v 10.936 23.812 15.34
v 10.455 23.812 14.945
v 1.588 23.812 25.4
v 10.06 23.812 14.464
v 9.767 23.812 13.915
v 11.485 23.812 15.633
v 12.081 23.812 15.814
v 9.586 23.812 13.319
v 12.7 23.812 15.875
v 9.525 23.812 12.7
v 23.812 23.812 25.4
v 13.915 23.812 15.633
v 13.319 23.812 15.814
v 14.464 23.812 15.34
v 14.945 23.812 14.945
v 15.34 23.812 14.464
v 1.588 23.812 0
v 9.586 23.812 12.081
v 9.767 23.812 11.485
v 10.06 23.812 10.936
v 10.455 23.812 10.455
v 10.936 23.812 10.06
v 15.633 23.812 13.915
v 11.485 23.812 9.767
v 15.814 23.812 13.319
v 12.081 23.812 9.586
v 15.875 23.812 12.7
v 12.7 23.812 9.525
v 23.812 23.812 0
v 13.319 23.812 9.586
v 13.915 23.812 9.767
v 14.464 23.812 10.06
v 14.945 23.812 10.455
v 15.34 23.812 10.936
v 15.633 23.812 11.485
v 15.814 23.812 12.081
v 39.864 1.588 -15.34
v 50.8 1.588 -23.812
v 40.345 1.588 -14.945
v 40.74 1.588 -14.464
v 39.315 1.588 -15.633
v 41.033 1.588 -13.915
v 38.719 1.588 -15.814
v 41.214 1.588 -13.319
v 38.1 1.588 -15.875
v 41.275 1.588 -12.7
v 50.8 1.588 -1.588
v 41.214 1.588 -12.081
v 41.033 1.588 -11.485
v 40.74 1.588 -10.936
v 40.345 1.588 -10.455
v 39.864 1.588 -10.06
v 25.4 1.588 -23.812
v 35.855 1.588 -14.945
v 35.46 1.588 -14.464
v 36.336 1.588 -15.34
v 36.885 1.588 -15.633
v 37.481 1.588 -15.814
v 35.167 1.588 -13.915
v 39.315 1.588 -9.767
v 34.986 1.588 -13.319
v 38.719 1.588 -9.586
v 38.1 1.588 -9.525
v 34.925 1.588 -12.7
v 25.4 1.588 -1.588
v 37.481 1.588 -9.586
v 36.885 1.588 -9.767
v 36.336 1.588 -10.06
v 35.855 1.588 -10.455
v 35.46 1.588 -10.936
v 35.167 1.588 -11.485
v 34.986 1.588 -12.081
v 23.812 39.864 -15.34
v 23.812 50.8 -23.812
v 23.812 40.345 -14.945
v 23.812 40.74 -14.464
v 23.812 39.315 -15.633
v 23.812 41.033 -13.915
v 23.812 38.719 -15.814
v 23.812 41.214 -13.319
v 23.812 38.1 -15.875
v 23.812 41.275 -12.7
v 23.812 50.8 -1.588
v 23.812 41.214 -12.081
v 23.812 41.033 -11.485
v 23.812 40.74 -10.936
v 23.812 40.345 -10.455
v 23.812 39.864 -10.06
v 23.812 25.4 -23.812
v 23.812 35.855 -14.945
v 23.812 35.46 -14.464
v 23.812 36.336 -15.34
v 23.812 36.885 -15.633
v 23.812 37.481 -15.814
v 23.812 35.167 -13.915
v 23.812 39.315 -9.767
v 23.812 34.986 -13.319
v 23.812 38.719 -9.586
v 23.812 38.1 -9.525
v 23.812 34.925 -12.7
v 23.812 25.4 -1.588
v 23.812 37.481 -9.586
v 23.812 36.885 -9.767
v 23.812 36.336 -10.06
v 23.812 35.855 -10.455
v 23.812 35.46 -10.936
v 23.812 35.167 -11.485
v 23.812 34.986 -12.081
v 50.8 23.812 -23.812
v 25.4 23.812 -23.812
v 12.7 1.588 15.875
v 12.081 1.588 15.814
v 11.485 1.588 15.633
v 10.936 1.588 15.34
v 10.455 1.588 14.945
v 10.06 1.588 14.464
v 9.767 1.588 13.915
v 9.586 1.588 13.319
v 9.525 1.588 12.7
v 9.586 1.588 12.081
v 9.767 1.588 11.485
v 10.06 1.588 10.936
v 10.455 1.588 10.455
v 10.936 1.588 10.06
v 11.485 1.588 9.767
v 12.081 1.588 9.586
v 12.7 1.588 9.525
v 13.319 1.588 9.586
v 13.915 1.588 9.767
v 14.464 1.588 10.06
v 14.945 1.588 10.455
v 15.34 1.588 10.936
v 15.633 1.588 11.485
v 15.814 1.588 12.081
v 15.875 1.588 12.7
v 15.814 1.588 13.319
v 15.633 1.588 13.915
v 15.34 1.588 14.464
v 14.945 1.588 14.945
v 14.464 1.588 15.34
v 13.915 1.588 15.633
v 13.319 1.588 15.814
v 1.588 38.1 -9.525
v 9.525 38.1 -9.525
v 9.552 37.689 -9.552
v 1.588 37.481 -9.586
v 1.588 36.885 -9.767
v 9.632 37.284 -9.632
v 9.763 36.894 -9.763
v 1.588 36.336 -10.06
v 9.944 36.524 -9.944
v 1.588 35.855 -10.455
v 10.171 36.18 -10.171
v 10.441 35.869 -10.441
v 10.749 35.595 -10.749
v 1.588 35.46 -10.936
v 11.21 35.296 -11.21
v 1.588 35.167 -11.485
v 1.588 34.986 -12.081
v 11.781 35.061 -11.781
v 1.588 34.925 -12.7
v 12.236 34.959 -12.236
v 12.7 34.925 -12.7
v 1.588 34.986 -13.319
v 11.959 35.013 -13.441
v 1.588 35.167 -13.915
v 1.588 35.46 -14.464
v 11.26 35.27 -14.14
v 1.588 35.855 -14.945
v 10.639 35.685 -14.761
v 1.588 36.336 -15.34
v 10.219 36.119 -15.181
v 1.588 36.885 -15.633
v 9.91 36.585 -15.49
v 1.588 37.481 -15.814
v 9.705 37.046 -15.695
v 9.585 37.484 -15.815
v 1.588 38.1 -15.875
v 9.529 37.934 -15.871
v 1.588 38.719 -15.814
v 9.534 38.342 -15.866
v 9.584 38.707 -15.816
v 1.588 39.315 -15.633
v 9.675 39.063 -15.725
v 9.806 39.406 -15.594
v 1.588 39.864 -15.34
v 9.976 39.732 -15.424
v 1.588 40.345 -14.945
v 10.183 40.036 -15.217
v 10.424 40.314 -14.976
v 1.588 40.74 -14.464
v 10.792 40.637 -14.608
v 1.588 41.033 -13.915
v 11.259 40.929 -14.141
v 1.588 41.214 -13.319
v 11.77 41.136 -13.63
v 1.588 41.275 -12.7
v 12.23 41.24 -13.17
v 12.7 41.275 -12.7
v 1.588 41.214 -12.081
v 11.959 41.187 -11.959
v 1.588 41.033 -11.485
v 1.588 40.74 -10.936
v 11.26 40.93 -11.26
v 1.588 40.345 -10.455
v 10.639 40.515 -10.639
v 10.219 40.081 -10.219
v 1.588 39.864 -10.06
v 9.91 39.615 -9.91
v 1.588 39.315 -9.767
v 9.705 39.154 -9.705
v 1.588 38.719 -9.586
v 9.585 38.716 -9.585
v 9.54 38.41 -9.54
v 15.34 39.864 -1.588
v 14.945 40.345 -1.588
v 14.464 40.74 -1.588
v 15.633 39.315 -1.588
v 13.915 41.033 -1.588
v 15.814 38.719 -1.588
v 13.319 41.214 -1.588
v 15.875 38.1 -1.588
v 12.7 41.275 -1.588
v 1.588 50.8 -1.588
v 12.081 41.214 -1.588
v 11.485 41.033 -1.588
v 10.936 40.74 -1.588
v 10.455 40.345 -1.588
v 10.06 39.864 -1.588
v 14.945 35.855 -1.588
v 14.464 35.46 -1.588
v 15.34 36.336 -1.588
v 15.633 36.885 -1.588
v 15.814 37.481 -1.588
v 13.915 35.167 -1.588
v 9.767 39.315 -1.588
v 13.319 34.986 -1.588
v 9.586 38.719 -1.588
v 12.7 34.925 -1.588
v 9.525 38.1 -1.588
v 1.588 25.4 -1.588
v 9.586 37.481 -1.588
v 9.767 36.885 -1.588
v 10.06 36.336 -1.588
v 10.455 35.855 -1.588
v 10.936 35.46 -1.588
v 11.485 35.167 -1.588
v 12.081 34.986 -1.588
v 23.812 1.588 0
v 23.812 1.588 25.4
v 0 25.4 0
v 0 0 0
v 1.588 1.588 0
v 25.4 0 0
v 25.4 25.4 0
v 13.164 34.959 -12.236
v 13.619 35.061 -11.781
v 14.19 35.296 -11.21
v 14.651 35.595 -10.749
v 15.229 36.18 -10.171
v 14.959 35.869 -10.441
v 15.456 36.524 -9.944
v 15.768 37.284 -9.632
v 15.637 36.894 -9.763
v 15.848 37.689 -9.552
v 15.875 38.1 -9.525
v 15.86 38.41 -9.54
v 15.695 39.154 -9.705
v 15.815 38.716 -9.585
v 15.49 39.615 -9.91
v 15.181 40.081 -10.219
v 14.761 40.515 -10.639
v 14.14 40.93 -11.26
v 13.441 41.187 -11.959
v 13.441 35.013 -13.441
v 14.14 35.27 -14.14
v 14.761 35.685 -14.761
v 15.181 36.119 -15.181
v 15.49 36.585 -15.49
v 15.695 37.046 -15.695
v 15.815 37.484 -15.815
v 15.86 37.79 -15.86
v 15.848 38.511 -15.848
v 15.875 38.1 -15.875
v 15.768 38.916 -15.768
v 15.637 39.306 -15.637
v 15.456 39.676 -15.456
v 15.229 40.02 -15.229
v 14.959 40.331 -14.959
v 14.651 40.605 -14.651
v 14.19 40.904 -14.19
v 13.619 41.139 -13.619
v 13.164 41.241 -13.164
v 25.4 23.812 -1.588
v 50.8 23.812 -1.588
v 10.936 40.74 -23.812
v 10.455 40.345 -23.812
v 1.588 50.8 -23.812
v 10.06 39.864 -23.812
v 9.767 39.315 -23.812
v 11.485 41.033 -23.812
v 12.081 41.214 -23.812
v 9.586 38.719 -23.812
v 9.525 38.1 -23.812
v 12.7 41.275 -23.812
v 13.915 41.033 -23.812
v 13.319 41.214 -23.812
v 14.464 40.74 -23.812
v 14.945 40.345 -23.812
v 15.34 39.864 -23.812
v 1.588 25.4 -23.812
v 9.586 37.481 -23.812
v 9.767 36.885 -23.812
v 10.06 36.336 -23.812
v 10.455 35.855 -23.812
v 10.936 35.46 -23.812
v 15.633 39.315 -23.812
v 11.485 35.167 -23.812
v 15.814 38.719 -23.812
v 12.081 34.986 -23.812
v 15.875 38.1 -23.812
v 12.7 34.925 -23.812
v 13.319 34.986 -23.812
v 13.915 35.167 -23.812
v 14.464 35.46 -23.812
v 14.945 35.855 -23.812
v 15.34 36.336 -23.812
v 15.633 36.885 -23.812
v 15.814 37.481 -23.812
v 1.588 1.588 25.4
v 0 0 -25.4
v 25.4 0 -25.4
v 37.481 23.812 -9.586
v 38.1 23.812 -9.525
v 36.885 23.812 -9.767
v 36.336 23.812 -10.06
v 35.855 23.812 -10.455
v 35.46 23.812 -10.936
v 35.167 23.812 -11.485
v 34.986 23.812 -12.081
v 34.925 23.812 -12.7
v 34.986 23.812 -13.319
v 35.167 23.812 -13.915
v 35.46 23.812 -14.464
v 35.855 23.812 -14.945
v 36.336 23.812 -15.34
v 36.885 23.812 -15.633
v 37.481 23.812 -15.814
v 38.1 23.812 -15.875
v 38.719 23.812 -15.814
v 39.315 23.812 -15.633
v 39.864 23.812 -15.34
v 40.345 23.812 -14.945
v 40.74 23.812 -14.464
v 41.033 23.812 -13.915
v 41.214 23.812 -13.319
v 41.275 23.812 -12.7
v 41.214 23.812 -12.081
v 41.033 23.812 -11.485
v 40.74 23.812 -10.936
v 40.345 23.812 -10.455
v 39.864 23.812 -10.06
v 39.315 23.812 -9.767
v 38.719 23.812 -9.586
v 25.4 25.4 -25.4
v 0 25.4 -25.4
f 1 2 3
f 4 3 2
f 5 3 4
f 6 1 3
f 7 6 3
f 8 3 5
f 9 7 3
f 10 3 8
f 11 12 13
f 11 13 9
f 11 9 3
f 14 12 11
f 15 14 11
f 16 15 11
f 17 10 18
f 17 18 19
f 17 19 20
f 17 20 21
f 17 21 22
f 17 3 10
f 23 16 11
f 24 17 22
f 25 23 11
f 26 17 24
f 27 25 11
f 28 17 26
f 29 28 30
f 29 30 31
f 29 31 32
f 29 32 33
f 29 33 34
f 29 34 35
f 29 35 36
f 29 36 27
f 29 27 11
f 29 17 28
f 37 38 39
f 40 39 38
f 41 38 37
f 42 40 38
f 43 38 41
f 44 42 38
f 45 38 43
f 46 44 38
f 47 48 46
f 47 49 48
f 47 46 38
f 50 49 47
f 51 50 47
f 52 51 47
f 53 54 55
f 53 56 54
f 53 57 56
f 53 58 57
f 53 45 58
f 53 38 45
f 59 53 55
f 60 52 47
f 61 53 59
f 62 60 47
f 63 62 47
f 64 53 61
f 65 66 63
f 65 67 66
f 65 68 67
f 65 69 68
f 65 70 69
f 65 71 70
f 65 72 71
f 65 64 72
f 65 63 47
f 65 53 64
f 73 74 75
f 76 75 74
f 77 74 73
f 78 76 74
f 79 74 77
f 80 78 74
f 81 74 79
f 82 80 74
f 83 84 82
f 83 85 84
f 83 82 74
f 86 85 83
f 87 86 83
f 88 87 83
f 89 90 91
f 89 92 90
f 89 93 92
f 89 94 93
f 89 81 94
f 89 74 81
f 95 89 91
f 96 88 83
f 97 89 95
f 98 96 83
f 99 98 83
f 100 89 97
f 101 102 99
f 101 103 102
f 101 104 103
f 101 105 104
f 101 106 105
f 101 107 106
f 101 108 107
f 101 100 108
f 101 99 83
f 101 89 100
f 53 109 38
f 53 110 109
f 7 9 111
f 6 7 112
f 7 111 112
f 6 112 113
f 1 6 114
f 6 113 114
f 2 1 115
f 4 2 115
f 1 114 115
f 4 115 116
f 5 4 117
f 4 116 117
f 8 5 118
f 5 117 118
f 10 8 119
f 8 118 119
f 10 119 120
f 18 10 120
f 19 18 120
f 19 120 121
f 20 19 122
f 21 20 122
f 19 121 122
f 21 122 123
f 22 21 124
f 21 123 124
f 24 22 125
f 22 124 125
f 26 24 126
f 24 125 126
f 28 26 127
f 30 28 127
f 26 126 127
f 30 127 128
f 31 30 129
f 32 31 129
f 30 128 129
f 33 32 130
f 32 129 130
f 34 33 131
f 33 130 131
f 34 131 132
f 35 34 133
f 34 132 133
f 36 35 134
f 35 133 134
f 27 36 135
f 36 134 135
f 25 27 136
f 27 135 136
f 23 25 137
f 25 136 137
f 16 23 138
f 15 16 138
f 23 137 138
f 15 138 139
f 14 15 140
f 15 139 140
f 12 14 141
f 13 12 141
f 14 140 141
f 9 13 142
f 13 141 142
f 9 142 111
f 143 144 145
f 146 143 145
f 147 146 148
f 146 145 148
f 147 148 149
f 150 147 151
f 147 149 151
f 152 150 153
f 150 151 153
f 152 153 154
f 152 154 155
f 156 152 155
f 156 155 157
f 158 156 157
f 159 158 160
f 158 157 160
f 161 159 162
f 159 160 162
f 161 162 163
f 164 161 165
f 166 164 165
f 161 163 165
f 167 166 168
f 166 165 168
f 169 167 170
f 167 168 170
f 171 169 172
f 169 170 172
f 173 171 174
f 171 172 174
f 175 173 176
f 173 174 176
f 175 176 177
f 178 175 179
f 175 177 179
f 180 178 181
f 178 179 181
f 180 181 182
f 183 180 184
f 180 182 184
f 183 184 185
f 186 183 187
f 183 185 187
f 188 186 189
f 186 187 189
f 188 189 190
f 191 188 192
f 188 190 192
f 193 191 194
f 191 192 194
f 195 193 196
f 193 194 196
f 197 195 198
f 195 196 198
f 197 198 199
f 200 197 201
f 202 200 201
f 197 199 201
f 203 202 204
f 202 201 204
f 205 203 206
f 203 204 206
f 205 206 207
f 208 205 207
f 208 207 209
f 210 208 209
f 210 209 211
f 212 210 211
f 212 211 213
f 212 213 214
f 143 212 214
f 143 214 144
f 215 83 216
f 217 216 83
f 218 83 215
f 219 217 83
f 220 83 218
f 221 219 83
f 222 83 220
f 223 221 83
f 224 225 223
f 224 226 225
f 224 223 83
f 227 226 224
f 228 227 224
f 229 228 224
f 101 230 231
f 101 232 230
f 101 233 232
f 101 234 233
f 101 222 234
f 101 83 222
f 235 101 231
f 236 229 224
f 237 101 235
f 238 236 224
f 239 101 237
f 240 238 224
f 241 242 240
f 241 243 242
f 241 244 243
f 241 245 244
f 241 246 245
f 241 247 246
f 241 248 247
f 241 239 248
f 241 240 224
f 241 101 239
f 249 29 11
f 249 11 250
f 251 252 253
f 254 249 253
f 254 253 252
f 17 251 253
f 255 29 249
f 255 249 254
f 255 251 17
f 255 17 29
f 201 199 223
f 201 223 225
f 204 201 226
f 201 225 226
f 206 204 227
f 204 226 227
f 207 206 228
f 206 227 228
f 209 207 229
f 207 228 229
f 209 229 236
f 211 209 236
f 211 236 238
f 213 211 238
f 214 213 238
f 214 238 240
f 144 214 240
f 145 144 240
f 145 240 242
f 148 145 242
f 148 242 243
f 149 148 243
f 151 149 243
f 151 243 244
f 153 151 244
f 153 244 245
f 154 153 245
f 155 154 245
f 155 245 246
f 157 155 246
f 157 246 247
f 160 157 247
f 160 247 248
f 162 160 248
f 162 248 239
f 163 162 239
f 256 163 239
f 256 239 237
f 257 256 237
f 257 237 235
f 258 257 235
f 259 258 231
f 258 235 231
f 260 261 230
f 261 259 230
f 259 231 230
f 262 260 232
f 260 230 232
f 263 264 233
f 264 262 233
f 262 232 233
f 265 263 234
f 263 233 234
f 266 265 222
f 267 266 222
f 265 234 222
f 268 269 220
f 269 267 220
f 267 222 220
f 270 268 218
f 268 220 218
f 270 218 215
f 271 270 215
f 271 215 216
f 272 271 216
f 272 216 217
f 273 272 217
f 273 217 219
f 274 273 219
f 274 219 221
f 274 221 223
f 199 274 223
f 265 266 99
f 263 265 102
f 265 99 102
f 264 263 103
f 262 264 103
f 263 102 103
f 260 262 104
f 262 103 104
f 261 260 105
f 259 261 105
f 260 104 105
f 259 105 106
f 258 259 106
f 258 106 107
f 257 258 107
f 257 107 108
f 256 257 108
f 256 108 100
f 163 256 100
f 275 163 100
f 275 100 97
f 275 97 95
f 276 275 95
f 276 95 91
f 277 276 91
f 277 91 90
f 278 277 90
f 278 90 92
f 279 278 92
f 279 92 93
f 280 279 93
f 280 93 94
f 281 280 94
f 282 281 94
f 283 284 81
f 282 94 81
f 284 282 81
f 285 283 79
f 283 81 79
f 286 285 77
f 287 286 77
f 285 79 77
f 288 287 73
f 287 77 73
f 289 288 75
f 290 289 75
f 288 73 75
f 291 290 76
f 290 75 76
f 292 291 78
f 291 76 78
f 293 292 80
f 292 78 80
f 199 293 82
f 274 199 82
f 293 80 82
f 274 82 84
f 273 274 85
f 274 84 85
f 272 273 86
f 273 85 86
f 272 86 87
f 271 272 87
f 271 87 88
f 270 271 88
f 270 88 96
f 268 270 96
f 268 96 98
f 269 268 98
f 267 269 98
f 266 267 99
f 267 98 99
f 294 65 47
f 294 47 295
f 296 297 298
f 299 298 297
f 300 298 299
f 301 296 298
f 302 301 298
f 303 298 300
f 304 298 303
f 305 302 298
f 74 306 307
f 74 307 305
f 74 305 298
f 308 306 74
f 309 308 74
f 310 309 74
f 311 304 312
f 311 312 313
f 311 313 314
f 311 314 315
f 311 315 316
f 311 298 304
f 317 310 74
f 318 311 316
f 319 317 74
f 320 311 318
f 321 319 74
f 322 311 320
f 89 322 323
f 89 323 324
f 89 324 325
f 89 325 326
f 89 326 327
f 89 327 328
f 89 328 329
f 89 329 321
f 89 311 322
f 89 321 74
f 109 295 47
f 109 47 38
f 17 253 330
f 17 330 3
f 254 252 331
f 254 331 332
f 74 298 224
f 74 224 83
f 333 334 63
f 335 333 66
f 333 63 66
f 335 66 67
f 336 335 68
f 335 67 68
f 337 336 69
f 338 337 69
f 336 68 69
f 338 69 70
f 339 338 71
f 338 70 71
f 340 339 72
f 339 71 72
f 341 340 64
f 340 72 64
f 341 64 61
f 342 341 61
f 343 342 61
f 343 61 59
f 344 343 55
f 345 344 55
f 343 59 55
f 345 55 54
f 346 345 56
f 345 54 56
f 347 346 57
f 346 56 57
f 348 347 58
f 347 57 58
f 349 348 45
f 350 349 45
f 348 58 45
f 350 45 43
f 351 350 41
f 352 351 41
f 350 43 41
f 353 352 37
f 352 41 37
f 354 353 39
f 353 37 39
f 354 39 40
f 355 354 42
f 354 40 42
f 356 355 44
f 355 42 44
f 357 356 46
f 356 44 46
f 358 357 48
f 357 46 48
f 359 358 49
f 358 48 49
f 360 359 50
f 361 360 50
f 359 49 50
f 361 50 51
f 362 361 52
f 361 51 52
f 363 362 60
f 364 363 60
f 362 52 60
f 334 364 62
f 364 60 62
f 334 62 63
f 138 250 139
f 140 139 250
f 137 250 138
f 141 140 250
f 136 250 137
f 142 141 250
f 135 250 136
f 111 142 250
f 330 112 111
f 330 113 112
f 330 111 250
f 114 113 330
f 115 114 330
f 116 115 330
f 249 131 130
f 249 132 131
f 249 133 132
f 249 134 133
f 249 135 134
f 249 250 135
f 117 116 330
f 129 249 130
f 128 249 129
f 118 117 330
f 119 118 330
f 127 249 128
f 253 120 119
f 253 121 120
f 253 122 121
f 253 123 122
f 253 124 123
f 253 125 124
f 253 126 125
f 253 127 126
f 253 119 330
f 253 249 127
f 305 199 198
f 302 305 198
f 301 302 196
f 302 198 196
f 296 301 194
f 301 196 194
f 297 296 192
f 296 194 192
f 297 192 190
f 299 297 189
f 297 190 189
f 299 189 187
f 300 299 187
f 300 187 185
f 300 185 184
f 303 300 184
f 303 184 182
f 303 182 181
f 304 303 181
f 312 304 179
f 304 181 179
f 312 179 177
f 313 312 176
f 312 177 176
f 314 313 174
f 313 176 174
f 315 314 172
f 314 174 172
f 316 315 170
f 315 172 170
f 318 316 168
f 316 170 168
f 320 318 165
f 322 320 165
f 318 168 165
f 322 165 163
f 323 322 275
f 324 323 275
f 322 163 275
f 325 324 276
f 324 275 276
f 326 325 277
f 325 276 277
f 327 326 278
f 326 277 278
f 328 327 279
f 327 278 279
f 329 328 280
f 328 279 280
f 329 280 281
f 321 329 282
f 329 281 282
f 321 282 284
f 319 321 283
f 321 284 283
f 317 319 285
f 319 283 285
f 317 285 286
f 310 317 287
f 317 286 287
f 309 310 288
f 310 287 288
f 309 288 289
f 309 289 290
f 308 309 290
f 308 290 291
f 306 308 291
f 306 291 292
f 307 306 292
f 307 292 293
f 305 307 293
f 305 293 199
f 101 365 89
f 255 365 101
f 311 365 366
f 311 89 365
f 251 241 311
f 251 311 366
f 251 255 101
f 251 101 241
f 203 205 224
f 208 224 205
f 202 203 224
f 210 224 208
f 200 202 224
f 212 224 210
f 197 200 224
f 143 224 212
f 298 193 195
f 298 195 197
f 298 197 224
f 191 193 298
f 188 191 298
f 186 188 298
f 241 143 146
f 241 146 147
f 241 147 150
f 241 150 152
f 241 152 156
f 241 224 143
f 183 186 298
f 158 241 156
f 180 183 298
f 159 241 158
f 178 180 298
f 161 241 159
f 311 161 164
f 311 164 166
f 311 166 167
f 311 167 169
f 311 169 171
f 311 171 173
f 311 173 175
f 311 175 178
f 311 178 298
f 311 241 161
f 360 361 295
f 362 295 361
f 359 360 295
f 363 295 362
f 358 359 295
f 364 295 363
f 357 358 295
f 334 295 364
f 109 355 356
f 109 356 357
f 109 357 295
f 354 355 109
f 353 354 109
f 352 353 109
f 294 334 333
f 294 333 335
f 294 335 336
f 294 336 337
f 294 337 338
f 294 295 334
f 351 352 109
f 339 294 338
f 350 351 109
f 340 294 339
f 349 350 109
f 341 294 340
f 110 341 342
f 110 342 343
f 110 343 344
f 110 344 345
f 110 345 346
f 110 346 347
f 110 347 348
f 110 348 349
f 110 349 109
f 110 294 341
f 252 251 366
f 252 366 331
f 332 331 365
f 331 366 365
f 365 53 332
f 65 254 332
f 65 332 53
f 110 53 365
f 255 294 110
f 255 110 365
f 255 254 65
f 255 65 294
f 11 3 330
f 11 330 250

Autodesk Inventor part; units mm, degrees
ref_plane "YZ Plane" through (0, 0, 0) normal (1, 0, 0) x (0, 1, 0)
ref_plane "XZ Plane" through (0, 0, 0) normal (0, 1, 0) x (-1, 0, 0)
ref_plane "XY Plane" through (0, 0, 0) normal (0, 0, 1) x (1, 0, 0)
sketch "Sketch1" plane through (0, 0, 0) normal (0, 0, 1) x (1, 0, 0)
  line L0 (0, 0) -> (25.4, 0)
  line L1 (25.4, 0) -> (25.4, 25.4)
  line L2 (25.4, 25.4) -> (0, 25.4)
  line L3 (0, 25.4) -> (0, 0)
  line L4 (1.5875, 23.8125) -> (23.8125, 23.8125)
  line L5 (23.8125, 23.8125) -> (23.8125, 1.5875)
  line L6 (23.8125, 1.5875) -> (1.5875, 1.5875)
  line L7 (1.5875, 1.5875) -> (1.5875, 23.8125)
  dimension "d0" = 25.4
  dimension "d1" = 25.4
  dimension "d4" = 1.5875
extrude "Extrusion1" add sketch "Sketch1" against normal blind 25.4 contours L3 L2 L1 L0 | L4 L5 L6 L7
extrude "Extrusion2" add sketch "Sketch1" along normal blind 25.4 contours L4 L5 L6 L7
sketch "Sketch2" plane through (25.4, 0, 0) normal (1, 0, 0) x (0, 0, -1)
  line L0 (25.4, 0) -> (25.4, 25.4) projected
  line L1 (0, 25.4) -> (25.4, 25.4) projected
  line L2 (0, 0) -> (0, 25.4) projected
  line L3 (0, 0) -> (25.4, 0) projected
  line L4 (23.8125, 23.8125) -> (23.8125, 1.5875)
  line L5 (23.8125, 1.5875) -> (1.5875, 1.5875)
  line L6 (1.5875, 1.5875) -> (1.5875, 23.8125)
  line L7 (1.5875, 23.8125) -> (23.8125, 23.8125)
  dimension "d8" = 1.5875
sketch "Sketch3" plane through (0, 25.4, 0) normal (0, 1, 0) x (1, 0, 0)
  line L0 (25.4, 25.4) -> (0, 25.4) projected
  line L1 (0, 0) -> (0, 25.4) projected
  line L2 (25.4, 0) -> (0, 0) projected
  line L3 (25.4, 0) -> (25.4, 25.4) projected
  line L4 (1.5875, 23.8125) -> (23.8125, 23.8125)
  line L5 (23.8125, 23.8125) -> (23.8125, 1.5875)
  line L6 (23.8125, 1.5875) -> (1.5875, 1.5875)
  line L7 (1.5875, 1.5875) -> (1.5875, 23.8125)
  dimension "d9" = 1.5875
extrude "Extrusion3" add sketch "Sketch2" along normal blind 25.4 contours L4 L5 L6 L7
extrude "Extrusion4" add sketch "Sketch3" along normal blind 25.4 contours L4 L5 L6 L7
sketch "Sketch4" plane through (1.5875, 25.4, -23.8125) normal (-1, 0, 0) x (0, 0, 1)
  point P0 (23.8125, -25.4)
  point P1 (11.1125, 12.7)
hole "Hole1" at (1.5875, 38.1, -12.7) direction (1, 0, 0) diameter 6.35 depth 25.4 tip angle 118
sketch "Sketch5" plane through (23.8125, 25.4, -23.8125) normal (0, 0, -1) x (-1, 0, 0)
  point P0 (23.8125, -25.4)
  point P1 (11.1125, 12.7)
hole "Hole2" at (12.7, 38.1, -23.8125) direction (0, 0, 1) diameter 6.35 depth 25.4 tip angle 118
sketch "Sketch6" plane through (1.5875, 23.8125, 25.4) normal (0, 1, 0) x (1, 0, 0)
  line L0 (0, 25.4) -> (22.225, 25.4) projected
  line L1 (23.8125, 25.4) -> (23.8125, 50.8) projected
  point P0 (-1.5875, 25.4)
  point P1 (11.1125, 12.7)
  point P2 (36.5125, 38.1)
  dimension "d28" = 12.7
  dimension "d29" = 12.7
hole "Hole3" at (12.7, 23.8125, 12.7) at (38.1, 23.8125, -12.7) direction (0, -1, 0) diameter 6.35 depth 25.4 tip angle 118
properties part number "3-way corner"
